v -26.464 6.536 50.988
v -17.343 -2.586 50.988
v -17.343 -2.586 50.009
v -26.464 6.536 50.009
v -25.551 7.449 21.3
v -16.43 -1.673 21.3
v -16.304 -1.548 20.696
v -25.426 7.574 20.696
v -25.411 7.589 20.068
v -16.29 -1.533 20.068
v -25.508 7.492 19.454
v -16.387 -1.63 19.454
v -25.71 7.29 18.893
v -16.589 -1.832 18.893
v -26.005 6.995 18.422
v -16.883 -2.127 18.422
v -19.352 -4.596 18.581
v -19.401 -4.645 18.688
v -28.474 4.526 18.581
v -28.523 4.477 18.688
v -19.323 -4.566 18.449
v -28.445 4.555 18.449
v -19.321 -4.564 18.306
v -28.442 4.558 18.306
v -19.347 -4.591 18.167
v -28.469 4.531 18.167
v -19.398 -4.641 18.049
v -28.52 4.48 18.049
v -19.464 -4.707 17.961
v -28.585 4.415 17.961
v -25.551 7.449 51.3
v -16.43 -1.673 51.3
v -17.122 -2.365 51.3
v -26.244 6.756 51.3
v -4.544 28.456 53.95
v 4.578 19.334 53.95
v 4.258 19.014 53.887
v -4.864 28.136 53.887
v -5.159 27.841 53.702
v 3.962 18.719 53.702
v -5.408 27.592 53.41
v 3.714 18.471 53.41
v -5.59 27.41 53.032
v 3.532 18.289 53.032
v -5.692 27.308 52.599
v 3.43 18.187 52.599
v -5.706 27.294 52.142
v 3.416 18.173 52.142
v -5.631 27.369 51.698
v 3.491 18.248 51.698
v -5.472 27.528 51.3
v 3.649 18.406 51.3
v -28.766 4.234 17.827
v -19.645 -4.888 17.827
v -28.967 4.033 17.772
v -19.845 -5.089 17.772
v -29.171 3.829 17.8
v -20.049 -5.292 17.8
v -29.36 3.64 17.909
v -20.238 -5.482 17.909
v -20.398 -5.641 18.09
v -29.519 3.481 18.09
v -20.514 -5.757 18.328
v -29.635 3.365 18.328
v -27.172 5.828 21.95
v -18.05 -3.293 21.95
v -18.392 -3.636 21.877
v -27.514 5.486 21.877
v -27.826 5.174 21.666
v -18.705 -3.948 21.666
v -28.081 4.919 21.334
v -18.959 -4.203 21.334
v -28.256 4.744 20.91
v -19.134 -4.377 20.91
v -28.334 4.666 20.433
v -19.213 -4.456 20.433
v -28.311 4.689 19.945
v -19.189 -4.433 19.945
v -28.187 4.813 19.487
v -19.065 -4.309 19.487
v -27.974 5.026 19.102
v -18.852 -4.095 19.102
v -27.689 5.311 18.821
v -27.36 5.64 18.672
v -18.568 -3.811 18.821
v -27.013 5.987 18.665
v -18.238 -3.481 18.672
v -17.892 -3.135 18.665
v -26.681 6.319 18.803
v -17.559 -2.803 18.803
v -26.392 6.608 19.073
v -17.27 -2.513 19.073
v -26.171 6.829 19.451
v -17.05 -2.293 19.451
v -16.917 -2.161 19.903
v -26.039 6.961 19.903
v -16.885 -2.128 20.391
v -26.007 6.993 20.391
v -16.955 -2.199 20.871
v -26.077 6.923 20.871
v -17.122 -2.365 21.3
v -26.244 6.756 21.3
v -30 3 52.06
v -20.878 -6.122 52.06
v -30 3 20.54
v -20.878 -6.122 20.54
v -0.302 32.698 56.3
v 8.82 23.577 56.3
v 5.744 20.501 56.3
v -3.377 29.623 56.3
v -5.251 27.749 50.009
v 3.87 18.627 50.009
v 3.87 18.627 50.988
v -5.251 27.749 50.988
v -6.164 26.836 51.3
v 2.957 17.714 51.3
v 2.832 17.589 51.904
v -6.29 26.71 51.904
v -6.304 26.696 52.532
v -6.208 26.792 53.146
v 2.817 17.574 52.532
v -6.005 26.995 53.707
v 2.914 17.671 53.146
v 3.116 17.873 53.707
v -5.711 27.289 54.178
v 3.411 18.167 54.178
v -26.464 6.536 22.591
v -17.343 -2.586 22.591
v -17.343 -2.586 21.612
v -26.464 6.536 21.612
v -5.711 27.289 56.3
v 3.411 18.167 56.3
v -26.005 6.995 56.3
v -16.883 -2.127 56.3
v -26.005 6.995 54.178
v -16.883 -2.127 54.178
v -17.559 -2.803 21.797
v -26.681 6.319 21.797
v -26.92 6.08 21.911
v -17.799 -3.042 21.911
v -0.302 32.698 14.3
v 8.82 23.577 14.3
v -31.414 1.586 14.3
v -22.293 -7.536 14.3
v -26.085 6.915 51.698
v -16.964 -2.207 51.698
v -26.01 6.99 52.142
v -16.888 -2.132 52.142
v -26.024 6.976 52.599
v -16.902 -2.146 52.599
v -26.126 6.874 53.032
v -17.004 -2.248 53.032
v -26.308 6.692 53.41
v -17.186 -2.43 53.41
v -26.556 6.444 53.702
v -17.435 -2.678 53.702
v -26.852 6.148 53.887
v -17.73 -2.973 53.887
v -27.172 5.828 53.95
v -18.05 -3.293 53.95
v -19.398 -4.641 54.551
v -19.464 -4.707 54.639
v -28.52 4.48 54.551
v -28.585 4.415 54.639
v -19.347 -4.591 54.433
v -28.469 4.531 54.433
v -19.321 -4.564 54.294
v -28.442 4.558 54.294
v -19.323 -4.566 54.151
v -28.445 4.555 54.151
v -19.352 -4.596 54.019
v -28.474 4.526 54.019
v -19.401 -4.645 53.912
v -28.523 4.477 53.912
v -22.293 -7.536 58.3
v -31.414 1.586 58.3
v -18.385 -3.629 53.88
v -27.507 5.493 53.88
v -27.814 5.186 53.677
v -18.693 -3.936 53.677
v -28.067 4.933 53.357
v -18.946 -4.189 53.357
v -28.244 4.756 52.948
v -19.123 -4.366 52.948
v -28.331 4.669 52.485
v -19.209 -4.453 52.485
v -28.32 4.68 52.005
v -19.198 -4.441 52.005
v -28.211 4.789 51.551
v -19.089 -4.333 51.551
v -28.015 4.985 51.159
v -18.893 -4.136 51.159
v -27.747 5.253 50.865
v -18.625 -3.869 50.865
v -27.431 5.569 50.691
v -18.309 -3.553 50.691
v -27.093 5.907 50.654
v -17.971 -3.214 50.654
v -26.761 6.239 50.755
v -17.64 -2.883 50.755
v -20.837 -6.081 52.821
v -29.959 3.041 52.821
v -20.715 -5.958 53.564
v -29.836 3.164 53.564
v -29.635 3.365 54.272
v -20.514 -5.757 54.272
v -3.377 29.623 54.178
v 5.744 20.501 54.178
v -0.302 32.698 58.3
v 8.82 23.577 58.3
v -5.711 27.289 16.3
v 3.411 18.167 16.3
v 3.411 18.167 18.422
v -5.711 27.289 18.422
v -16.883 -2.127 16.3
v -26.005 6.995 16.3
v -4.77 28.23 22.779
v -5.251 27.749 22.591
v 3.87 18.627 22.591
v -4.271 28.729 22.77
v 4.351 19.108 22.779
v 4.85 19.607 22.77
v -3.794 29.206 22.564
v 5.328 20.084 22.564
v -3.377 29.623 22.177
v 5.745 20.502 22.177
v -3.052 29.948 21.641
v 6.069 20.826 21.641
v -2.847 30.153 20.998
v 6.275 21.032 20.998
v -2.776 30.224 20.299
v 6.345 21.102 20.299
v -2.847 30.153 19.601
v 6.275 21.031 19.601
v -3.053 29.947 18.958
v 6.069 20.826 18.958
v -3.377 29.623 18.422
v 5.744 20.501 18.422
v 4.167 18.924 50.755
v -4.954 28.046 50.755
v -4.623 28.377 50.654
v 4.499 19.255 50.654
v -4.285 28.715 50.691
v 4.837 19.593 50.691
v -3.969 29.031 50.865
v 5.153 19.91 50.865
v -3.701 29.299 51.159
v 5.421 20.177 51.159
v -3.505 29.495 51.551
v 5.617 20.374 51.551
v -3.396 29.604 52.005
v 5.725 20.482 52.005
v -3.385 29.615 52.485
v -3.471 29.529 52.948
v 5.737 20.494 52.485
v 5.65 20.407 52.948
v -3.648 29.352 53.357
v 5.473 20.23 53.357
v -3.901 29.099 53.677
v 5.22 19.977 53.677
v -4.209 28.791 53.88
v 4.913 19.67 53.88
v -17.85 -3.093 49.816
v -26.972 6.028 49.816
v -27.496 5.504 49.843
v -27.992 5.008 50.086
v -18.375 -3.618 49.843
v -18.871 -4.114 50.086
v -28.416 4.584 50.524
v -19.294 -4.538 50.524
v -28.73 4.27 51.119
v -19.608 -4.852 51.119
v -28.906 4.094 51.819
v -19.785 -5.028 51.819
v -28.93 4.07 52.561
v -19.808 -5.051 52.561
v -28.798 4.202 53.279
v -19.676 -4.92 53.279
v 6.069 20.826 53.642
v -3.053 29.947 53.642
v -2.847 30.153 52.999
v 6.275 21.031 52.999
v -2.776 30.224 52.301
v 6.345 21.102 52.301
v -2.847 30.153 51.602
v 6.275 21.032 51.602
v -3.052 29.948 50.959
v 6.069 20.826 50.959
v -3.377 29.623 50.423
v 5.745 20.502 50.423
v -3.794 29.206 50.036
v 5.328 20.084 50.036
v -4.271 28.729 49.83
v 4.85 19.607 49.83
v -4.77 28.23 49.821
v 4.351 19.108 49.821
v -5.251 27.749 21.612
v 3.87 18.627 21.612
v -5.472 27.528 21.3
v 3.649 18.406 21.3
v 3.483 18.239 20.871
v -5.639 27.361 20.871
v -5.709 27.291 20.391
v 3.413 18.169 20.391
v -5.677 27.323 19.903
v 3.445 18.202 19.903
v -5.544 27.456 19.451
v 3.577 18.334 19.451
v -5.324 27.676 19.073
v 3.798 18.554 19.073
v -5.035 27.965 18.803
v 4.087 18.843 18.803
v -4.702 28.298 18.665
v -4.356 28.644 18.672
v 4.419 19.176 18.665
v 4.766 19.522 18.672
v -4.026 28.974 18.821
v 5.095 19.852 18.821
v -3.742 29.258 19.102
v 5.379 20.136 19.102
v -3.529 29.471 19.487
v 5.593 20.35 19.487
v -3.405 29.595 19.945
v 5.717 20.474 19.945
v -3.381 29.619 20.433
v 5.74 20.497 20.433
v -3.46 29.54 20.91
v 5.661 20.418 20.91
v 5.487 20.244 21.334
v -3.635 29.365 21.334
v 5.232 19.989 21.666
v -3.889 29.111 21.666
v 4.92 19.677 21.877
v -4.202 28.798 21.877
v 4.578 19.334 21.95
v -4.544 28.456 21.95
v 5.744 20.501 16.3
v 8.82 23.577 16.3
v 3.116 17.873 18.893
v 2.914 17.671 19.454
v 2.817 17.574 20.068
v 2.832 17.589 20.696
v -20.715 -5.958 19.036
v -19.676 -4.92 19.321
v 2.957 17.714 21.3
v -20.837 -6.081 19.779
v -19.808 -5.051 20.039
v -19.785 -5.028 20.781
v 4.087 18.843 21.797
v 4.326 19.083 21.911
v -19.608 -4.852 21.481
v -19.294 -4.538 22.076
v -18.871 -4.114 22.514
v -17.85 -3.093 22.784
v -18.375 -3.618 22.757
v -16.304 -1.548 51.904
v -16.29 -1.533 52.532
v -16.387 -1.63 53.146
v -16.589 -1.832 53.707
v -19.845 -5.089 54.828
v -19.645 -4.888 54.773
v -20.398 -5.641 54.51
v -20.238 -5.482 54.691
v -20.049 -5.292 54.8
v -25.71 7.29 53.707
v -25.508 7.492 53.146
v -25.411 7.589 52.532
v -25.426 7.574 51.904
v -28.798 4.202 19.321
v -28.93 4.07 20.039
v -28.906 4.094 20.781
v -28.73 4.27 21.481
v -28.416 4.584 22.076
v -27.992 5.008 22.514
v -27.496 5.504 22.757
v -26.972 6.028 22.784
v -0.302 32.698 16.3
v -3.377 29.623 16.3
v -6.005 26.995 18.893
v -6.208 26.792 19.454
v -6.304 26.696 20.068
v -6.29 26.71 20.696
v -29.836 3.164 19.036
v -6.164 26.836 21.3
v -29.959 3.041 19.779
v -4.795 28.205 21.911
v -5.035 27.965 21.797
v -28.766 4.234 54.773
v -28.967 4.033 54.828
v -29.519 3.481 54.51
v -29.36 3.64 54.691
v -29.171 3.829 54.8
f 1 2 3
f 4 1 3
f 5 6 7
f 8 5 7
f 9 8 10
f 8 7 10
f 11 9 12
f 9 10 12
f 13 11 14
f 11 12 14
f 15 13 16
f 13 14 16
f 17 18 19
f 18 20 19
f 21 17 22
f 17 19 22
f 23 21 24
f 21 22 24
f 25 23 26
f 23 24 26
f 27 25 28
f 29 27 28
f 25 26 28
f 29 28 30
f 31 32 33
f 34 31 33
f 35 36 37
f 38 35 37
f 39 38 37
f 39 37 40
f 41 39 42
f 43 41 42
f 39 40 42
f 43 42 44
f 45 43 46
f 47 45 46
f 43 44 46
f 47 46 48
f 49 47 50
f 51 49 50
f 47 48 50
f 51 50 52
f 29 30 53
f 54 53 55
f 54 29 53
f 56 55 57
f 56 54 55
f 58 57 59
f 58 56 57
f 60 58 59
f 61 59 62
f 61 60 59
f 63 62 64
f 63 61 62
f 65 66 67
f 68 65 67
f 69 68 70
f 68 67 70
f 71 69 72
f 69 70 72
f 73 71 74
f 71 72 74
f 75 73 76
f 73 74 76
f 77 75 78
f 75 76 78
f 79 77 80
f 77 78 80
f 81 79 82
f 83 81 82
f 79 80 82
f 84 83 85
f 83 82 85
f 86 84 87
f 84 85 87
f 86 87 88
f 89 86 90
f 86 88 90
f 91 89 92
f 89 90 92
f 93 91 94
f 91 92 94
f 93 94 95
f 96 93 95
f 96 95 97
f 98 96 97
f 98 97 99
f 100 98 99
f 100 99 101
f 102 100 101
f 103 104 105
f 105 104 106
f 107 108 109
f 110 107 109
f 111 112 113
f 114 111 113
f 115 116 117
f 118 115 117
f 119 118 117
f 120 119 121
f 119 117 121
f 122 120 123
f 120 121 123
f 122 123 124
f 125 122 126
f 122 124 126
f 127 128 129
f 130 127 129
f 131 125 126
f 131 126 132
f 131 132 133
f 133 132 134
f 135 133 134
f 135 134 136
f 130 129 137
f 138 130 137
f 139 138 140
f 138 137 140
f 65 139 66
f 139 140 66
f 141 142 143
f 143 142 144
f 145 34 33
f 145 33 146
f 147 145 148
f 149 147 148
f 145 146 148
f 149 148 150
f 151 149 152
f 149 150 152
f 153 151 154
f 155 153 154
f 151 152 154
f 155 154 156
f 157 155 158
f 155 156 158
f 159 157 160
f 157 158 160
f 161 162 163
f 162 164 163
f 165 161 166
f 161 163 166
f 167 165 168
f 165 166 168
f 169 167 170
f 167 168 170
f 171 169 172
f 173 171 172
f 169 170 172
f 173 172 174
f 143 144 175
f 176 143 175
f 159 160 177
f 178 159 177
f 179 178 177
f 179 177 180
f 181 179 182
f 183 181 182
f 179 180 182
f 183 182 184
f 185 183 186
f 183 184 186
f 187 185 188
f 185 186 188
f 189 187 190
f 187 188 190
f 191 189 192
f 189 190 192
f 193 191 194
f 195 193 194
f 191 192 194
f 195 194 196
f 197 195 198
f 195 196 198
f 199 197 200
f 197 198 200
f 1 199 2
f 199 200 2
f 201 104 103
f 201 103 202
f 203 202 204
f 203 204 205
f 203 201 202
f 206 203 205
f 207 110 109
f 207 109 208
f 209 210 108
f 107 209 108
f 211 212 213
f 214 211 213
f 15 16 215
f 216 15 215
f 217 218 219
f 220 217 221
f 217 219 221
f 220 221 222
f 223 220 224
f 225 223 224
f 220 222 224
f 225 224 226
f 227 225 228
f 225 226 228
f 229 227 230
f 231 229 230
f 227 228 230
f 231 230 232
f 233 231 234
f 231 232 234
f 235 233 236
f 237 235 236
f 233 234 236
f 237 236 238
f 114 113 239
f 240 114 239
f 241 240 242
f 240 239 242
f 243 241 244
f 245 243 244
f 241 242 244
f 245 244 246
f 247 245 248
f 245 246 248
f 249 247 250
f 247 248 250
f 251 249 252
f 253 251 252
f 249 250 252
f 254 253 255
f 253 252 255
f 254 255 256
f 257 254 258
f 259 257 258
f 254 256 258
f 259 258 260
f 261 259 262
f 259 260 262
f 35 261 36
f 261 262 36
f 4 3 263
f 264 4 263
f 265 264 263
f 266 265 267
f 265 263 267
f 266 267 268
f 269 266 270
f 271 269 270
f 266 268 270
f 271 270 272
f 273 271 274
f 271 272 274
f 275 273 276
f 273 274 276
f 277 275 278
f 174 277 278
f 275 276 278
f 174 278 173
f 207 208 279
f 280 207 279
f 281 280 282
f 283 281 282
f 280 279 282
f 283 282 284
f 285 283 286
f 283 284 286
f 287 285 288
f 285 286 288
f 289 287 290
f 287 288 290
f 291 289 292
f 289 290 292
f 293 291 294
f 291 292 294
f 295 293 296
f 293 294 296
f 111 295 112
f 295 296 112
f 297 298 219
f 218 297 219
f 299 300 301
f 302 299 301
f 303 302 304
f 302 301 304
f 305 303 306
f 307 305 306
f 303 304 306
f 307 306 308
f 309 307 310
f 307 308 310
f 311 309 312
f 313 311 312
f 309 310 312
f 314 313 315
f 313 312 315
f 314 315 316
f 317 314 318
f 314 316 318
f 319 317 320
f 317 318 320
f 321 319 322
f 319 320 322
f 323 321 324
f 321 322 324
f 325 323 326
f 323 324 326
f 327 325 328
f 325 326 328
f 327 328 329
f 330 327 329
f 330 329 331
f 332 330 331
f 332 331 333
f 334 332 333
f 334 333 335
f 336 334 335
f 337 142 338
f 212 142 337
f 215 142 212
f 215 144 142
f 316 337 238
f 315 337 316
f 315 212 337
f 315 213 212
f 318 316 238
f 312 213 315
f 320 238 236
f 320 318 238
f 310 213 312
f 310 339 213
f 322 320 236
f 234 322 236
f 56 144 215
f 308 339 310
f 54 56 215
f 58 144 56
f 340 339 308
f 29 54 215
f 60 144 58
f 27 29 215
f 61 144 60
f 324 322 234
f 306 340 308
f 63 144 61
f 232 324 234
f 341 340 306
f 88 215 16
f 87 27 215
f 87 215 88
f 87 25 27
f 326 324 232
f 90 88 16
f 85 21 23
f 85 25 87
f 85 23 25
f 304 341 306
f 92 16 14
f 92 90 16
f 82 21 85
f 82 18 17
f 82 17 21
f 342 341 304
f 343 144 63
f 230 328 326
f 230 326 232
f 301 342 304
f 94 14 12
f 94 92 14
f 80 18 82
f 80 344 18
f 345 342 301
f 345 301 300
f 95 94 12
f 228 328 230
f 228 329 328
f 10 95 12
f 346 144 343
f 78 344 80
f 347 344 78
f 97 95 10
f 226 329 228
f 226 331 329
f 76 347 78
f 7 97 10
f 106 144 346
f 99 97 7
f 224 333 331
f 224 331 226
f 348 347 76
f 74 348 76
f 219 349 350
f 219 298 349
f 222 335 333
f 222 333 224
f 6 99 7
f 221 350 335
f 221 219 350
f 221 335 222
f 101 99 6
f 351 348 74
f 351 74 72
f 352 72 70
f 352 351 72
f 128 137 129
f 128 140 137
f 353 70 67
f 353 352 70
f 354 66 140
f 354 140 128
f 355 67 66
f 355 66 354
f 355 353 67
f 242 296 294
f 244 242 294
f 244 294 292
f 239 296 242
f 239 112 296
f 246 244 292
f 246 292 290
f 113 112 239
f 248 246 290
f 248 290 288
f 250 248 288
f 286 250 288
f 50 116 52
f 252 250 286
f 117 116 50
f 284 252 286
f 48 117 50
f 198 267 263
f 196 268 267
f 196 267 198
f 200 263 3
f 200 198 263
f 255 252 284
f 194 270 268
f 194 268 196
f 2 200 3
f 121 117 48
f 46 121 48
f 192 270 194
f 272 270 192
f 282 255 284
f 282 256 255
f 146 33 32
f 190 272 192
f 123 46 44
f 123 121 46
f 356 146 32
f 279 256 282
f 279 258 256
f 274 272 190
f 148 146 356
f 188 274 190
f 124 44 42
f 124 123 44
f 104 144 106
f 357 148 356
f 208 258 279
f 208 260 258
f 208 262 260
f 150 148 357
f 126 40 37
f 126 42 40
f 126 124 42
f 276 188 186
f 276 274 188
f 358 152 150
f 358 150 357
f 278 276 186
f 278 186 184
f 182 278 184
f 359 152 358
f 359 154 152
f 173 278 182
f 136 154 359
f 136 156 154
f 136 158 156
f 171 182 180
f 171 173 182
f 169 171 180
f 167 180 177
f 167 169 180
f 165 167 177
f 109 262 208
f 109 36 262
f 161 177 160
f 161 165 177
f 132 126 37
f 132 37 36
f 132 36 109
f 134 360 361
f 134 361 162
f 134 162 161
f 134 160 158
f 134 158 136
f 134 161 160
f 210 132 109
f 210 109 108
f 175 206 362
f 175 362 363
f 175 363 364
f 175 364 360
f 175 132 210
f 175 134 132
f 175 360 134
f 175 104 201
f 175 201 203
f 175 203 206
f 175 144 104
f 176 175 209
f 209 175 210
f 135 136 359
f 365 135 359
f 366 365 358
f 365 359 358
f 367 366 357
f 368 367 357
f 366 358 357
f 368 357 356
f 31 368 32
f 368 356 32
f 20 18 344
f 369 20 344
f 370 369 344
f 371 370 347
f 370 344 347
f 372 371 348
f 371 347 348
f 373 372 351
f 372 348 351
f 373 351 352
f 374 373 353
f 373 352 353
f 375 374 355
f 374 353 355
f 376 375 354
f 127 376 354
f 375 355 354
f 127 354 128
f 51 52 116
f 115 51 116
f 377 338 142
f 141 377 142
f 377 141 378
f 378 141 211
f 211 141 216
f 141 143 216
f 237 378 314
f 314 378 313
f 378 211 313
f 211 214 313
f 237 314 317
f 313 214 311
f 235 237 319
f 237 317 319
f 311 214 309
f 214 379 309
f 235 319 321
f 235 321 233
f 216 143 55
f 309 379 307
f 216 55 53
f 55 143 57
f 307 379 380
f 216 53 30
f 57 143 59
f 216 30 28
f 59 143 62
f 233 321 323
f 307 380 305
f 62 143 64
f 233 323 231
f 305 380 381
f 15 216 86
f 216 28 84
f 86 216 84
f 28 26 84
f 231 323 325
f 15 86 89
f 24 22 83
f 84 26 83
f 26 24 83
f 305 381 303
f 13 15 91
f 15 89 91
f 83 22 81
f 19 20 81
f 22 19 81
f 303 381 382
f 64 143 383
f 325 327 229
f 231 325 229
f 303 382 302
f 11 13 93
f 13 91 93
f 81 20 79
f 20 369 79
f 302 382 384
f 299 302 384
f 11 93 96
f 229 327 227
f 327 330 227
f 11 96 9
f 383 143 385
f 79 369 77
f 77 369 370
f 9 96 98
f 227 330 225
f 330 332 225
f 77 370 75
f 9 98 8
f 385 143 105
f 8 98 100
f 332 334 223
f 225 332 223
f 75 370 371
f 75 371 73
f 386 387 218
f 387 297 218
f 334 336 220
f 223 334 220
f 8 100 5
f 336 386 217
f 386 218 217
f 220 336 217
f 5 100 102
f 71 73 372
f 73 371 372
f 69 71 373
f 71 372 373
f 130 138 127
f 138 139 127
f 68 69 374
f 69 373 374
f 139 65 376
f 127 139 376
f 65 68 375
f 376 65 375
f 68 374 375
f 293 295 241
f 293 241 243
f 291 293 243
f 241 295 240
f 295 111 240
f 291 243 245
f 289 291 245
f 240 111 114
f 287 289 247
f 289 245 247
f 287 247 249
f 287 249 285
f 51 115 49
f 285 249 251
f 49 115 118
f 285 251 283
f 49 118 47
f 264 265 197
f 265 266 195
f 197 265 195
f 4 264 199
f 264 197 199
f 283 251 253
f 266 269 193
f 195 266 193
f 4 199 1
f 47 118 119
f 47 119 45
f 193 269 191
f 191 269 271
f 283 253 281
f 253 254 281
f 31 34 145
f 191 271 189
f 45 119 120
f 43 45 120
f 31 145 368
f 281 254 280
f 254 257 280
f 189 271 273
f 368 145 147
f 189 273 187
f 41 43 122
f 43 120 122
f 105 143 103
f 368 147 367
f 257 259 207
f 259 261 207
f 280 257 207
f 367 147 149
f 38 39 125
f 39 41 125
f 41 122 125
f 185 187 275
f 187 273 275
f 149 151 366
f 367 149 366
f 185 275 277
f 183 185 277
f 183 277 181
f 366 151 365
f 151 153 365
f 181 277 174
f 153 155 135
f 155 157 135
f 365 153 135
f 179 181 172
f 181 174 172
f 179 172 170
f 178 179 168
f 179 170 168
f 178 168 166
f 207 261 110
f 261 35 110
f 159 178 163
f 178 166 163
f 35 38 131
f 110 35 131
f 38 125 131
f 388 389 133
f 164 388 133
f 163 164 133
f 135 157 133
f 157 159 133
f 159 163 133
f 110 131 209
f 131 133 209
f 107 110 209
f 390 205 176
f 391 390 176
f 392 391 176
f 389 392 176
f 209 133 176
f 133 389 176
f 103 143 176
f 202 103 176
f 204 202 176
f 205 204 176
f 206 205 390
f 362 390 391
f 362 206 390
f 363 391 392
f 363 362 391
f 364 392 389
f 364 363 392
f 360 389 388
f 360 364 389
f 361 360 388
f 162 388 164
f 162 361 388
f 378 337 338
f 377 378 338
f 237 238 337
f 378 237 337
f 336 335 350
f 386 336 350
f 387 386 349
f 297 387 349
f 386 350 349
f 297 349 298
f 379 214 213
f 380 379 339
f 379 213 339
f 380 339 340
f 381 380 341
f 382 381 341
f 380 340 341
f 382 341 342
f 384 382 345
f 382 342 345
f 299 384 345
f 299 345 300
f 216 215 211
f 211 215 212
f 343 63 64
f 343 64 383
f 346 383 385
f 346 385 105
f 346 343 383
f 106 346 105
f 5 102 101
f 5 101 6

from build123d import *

# Parameters (mm, degrees)
BOSS_EXTRUDE1_DEPTH = 12.9
FILLET1_R           = 5
FILLET2_R           = 1
FILLET3_R           = 0.5


with BuildPart() as part:
    # Sketch2 → Boss-Extrude1 (new body)
    with BuildSketch(Plane(origin=(-7.378322523, 7.378322523, 0), x_dir=(0, 0, 1), z_dir=(-0.7071067811865452, 0.7071067811865498, 0))):
        with BuildLine():
            Line((56.29999994, -16.741883092), (56.29999994, -19.091883092))
            Line((56.29999994, -19.091883092), (16.29999994, -19.091883092))
            Line((16.29999994, -19.091883092), (16.29999994, -16.741883092))
            Line((16.29999994, -16.741883092), (18.421835943, -16.741883092))
            ThreePointArc((18.421835943, -16.741883092), (21.641004351, -17.201790003), (22.591287788, -14.091883092))
            Line((22.591287788, -14.091883092), (22.29999994, -14.091883092))
            Line((22.29999994, -14.091883092), (21.612440415, -14.091883092))
            ThreePointArc((21.612440415, -14.091883092), (21.863334003, -14.564164788), (21.94999994, -15.091883092))
            ThreePointArc((21.94999994, -15.091883092), (18.821402632, -15.824174018), (21.29999994, -13.779442617))
            Line((21.29999994, -13.779442617), (21.29999994, -13.091883092))
            Line((21.29999994, -13.091883092), (21.29999994, -12.800595245))
            ThreePointArc((21.29999994, -12.800595245), (19.756303769, -12.651720296), (18.421835943, -13.441883092))
            Line((18.421835943, -13.441883092), (16.29999994, -13.441883092))
            Line((16.29999994, -13.441883092), (16.29999994, 15.258116908))
            Line((16.29999994, 15.258116908), (18.421835943, 15.258116908))
            ThreePointArc((18.421835943, 15.258116908), (19.756303769, 14.467954112), (21.29999994, 14.61682906))
            Line((21.29999994, 14.61682906), (21.29999994, 14.908116908))
            Line((21.29999994, 14.908116908), (21.29999994, 15.595676433))
            ThreePointArc((21.29999994, 15.595676433), (18.821402632, 17.640407834), (21.94999994, 16.908116908))
            ThreePointArc((21.94999994, 16.908116908), (21.863334003, 16.380398604), (21.612440415, 15.908116908))
            Line((21.612440415, 15.908116908), (22.29999994, 15.908116908))
            Line((22.29999994, 15.908116908), (22.591287788, 15.908116908))
            ThreePointArc((22.591287788, 15.908116908), (21.641004351, 19.018023818), (18.421835943, 18.558116908))
            Line((18.421835943, 18.558116908), (16.29999994, 18.558116908))
            Line((16.29999994, 18.558116908), (16.29999994, 22.908116908))
            Line((16.29999994, 22.908116908), (14.29999994, 22.908116908))
            Line((14.29999994, 22.908116908), (14.29999994, -21.091883092))
            Line((14.29999994, -21.091883092), (58.29999994, -21.091883092))
            Line((58.29999994, -21.091883092), (58.29999994, 22.908116908))
            Line((58.29999994, 22.908116908), (56.29999994, 22.908116908))
            Line((56.29999994, 22.908116908), (56.29999994, 18.558116541))
            Line((56.29999994, 18.558116541), (54.178163937, 18.558116908))
            ThreePointArc((54.178163937, 18.558116908), (50.95899553, 19.018023818), (50.008712093, 15.908116908))
            Line((50.008712093, 15.908116908), (50.29999994, 15.908116908))
            Line((50.29999994, 15.908116908), (50.987559466, 15.908116908))
            ThreePointArc((50.987559466, 15.908116908), (51.772281637, 18.471450971), (53.94999994, 16.908116908))
            ThreePointArc((53.94999994, 16.908116908), (53.032290866, 15.4295196), (51.29999994, 15.595676433))
            Line((51.29999994, 15.595676433), (51.29999994, 14.908116908))
            Line((51.29999994, 14.908116908), (51.29999994, 14.61682906))
            ThreePointArc((51.29999994, 14.61682906), (52.843696112, 14.467954112), (54.178163937, 15.258116908))
            Line((54.178163937, 15.258116908), (56.29999994, 15.258116908))
            Line((56.29999994, 15.258116908), (56.29999994, -13.441883092))
            Line((56.29999994, -13.441883092), (54.178163937, -13.441883092))
            ThreePointArc((54.178163937, -13.441883092), (52.843696112, -12.651720296), (51.29999994, -12.800595245))
            Line((51.29999994, -12.800595245), (51.29999994, -13.091883092))
            Line((51.29999994, -13.091883092), (51.29999994, -13.779442617))
            ThreePointArc((51.29999994, -13.779442617), (53.032290866, -13.613285784), (53.94999994, -15.091883092))
            ThreePointArc((53.94999994, -15.091883092), (51.772281637, -16.655217155), (50.987559466, -14.091883092))
            Line((50.987559466, -14.091883092), (50.29999994, -14.091883092))
            Line((50.29999994, -14.091883092), (50.008712093, -14.091883092))
            ThreePointArc((50.008712093, -14.091883092), (50.95899553, -17.201790003), (54.178163937, -16.741883092))
            Line((54.178163937, -16.741883092), (56.29999994, -16.741883092))
        make_face()
    extrude(amount=BOSS_EXTRUDE1_DEPTH)

    # Fillet1
    # the kernel refuses this fillet: 5 mm, written as the material it adds along each edge
    with BuildSketch(Plane(origin=(-20.878322523, -6.121677477, 56.29999994), x_dir=(0, 0, -1), z_dir=(-0.7071067811865452, 0.7071067811865498, 0))) as fillet1_piece_1:
        with BuildLine():
            CenterArc((4.239988208, -5), FILLET1_R, 90, 57.994545172)
            Line((0, -2.35), (-0.084799764, -2.297))
            ThreePointArc((-0.084799764, -2.297), (-0.1, -1.175), (-0.1, 0))
            Line((-0.1, 0), (0, 0.1))
            Line((0, 0.1), (4.239988208, 0.1))
            Line((4.239988208, 0.1), (4.239988208, 0))
        make_face()
    extrude(amount=12.9)
    with BuildSketch(Plane(origin=(-20.878322523, -6.121677477, 16.29999994), x_dir=(0.7071067811865498, 0.7071067811865452, 4.67144053935759e-13), z_dir=(-0.7071067811865452, 0.7071067811865498, 0))) as fillet1_piece_2:
        with BuildLine():
            CenterArc((5, -4.239988208), FILLET1_R, 122.005454828, 57.994545172)
            Line((0, -4.239988208), (-0.1, -4.239988208))
            Line((-0.1, -4.239988208), (-0.1, 0))
            Line((-0.1, 0), (0, 0.1))
            ThreePointArc((0, 0.1), (1.175, 0.1), (2.297, 0.084799764))
            Line((2.297, 0.084799764), (2.35, 0))
        make_face()
    extrude(amount=12.9)

    # Fillet2
    # the kernel refuses this fillet: 1 mm, written as the material it adds along each edge
    with BuildSketch(Plane(origin=(-19.216621587, -4.459976542, 16.29999994), x_dir=(-0.4742981469837023, -0.4742981469836992, 0.7416754920689071), z_dir=(-0.7071067811865452, 0.7071067811865498, 0))) as fillet2_piece_1:
        with BuildLine():
            CenterArc((2.460931793, 0.961889952), FILLET2_R, 152.5257211, 133.343162112)
            Line((1.573713762, 1.423240324), (1.555969401, 1.432467331))
            ThreePointArc((1.555969401, 1.432467331), (0.773441703, 0.726453672), (-0.013415177, 0.01483351))
            Line((-0.013415177, 0.01483351), (-0.005468737, -0.019237799))
            ThreePointArc((-0.005468737, -0.019237799), (1.367184329, -0.210550238), (2.739837396, -0.019237799))
            Line((2.739837396, -0.019237799), (2.734368658, 0))
        make_face()
    extrude(amount=12.9)
    with BuildSketch(Plane(origin=(-19.216621587, -4.459976542, 56.29999994), x_dir=(-0.47429814698388373, -0.4742981469838806, -0.7416754920686752), z_dir=(-0.7071067811865452, 0.7071067811865498, 0))) as fillet2_piece_2:
        with BuildLine():
            CenterArc((2.460931793, -0.961889952), FILLET2_R, 74.131116788, 133.343162112)
            Line((1.573713762, -1.423240324), (1.555969401, -1.432467331))
            ThreePointArc((1.555969401, -1.432467331), (0.773441703, -0.726453672), (-0.013415177, -0.01483351))
            Line((-0.013415177, -0.01483351), (-0.005468737, 0.019237799))
            ThreePointArc((-0.005468737, 0.019237799), (1.367184329, 0.210550238), (2.739837396, 0.019237799))
            Line((2.739837396, 0.019237799), (2.734368658, 0))
        make_face()
    extrude(amount=12.9)

    # Fillet3
    fillet3_edges = [part.edges().sort_by_distance(p)[0] for p in [
        (-23.777460326, 0.100862197, 18.421835943),
        (-23.777460326, 0.100862197, 54.178163937),
    ]]
    fillet(fillet3_edges, radius=FILLET3_R)


solid = part.part
